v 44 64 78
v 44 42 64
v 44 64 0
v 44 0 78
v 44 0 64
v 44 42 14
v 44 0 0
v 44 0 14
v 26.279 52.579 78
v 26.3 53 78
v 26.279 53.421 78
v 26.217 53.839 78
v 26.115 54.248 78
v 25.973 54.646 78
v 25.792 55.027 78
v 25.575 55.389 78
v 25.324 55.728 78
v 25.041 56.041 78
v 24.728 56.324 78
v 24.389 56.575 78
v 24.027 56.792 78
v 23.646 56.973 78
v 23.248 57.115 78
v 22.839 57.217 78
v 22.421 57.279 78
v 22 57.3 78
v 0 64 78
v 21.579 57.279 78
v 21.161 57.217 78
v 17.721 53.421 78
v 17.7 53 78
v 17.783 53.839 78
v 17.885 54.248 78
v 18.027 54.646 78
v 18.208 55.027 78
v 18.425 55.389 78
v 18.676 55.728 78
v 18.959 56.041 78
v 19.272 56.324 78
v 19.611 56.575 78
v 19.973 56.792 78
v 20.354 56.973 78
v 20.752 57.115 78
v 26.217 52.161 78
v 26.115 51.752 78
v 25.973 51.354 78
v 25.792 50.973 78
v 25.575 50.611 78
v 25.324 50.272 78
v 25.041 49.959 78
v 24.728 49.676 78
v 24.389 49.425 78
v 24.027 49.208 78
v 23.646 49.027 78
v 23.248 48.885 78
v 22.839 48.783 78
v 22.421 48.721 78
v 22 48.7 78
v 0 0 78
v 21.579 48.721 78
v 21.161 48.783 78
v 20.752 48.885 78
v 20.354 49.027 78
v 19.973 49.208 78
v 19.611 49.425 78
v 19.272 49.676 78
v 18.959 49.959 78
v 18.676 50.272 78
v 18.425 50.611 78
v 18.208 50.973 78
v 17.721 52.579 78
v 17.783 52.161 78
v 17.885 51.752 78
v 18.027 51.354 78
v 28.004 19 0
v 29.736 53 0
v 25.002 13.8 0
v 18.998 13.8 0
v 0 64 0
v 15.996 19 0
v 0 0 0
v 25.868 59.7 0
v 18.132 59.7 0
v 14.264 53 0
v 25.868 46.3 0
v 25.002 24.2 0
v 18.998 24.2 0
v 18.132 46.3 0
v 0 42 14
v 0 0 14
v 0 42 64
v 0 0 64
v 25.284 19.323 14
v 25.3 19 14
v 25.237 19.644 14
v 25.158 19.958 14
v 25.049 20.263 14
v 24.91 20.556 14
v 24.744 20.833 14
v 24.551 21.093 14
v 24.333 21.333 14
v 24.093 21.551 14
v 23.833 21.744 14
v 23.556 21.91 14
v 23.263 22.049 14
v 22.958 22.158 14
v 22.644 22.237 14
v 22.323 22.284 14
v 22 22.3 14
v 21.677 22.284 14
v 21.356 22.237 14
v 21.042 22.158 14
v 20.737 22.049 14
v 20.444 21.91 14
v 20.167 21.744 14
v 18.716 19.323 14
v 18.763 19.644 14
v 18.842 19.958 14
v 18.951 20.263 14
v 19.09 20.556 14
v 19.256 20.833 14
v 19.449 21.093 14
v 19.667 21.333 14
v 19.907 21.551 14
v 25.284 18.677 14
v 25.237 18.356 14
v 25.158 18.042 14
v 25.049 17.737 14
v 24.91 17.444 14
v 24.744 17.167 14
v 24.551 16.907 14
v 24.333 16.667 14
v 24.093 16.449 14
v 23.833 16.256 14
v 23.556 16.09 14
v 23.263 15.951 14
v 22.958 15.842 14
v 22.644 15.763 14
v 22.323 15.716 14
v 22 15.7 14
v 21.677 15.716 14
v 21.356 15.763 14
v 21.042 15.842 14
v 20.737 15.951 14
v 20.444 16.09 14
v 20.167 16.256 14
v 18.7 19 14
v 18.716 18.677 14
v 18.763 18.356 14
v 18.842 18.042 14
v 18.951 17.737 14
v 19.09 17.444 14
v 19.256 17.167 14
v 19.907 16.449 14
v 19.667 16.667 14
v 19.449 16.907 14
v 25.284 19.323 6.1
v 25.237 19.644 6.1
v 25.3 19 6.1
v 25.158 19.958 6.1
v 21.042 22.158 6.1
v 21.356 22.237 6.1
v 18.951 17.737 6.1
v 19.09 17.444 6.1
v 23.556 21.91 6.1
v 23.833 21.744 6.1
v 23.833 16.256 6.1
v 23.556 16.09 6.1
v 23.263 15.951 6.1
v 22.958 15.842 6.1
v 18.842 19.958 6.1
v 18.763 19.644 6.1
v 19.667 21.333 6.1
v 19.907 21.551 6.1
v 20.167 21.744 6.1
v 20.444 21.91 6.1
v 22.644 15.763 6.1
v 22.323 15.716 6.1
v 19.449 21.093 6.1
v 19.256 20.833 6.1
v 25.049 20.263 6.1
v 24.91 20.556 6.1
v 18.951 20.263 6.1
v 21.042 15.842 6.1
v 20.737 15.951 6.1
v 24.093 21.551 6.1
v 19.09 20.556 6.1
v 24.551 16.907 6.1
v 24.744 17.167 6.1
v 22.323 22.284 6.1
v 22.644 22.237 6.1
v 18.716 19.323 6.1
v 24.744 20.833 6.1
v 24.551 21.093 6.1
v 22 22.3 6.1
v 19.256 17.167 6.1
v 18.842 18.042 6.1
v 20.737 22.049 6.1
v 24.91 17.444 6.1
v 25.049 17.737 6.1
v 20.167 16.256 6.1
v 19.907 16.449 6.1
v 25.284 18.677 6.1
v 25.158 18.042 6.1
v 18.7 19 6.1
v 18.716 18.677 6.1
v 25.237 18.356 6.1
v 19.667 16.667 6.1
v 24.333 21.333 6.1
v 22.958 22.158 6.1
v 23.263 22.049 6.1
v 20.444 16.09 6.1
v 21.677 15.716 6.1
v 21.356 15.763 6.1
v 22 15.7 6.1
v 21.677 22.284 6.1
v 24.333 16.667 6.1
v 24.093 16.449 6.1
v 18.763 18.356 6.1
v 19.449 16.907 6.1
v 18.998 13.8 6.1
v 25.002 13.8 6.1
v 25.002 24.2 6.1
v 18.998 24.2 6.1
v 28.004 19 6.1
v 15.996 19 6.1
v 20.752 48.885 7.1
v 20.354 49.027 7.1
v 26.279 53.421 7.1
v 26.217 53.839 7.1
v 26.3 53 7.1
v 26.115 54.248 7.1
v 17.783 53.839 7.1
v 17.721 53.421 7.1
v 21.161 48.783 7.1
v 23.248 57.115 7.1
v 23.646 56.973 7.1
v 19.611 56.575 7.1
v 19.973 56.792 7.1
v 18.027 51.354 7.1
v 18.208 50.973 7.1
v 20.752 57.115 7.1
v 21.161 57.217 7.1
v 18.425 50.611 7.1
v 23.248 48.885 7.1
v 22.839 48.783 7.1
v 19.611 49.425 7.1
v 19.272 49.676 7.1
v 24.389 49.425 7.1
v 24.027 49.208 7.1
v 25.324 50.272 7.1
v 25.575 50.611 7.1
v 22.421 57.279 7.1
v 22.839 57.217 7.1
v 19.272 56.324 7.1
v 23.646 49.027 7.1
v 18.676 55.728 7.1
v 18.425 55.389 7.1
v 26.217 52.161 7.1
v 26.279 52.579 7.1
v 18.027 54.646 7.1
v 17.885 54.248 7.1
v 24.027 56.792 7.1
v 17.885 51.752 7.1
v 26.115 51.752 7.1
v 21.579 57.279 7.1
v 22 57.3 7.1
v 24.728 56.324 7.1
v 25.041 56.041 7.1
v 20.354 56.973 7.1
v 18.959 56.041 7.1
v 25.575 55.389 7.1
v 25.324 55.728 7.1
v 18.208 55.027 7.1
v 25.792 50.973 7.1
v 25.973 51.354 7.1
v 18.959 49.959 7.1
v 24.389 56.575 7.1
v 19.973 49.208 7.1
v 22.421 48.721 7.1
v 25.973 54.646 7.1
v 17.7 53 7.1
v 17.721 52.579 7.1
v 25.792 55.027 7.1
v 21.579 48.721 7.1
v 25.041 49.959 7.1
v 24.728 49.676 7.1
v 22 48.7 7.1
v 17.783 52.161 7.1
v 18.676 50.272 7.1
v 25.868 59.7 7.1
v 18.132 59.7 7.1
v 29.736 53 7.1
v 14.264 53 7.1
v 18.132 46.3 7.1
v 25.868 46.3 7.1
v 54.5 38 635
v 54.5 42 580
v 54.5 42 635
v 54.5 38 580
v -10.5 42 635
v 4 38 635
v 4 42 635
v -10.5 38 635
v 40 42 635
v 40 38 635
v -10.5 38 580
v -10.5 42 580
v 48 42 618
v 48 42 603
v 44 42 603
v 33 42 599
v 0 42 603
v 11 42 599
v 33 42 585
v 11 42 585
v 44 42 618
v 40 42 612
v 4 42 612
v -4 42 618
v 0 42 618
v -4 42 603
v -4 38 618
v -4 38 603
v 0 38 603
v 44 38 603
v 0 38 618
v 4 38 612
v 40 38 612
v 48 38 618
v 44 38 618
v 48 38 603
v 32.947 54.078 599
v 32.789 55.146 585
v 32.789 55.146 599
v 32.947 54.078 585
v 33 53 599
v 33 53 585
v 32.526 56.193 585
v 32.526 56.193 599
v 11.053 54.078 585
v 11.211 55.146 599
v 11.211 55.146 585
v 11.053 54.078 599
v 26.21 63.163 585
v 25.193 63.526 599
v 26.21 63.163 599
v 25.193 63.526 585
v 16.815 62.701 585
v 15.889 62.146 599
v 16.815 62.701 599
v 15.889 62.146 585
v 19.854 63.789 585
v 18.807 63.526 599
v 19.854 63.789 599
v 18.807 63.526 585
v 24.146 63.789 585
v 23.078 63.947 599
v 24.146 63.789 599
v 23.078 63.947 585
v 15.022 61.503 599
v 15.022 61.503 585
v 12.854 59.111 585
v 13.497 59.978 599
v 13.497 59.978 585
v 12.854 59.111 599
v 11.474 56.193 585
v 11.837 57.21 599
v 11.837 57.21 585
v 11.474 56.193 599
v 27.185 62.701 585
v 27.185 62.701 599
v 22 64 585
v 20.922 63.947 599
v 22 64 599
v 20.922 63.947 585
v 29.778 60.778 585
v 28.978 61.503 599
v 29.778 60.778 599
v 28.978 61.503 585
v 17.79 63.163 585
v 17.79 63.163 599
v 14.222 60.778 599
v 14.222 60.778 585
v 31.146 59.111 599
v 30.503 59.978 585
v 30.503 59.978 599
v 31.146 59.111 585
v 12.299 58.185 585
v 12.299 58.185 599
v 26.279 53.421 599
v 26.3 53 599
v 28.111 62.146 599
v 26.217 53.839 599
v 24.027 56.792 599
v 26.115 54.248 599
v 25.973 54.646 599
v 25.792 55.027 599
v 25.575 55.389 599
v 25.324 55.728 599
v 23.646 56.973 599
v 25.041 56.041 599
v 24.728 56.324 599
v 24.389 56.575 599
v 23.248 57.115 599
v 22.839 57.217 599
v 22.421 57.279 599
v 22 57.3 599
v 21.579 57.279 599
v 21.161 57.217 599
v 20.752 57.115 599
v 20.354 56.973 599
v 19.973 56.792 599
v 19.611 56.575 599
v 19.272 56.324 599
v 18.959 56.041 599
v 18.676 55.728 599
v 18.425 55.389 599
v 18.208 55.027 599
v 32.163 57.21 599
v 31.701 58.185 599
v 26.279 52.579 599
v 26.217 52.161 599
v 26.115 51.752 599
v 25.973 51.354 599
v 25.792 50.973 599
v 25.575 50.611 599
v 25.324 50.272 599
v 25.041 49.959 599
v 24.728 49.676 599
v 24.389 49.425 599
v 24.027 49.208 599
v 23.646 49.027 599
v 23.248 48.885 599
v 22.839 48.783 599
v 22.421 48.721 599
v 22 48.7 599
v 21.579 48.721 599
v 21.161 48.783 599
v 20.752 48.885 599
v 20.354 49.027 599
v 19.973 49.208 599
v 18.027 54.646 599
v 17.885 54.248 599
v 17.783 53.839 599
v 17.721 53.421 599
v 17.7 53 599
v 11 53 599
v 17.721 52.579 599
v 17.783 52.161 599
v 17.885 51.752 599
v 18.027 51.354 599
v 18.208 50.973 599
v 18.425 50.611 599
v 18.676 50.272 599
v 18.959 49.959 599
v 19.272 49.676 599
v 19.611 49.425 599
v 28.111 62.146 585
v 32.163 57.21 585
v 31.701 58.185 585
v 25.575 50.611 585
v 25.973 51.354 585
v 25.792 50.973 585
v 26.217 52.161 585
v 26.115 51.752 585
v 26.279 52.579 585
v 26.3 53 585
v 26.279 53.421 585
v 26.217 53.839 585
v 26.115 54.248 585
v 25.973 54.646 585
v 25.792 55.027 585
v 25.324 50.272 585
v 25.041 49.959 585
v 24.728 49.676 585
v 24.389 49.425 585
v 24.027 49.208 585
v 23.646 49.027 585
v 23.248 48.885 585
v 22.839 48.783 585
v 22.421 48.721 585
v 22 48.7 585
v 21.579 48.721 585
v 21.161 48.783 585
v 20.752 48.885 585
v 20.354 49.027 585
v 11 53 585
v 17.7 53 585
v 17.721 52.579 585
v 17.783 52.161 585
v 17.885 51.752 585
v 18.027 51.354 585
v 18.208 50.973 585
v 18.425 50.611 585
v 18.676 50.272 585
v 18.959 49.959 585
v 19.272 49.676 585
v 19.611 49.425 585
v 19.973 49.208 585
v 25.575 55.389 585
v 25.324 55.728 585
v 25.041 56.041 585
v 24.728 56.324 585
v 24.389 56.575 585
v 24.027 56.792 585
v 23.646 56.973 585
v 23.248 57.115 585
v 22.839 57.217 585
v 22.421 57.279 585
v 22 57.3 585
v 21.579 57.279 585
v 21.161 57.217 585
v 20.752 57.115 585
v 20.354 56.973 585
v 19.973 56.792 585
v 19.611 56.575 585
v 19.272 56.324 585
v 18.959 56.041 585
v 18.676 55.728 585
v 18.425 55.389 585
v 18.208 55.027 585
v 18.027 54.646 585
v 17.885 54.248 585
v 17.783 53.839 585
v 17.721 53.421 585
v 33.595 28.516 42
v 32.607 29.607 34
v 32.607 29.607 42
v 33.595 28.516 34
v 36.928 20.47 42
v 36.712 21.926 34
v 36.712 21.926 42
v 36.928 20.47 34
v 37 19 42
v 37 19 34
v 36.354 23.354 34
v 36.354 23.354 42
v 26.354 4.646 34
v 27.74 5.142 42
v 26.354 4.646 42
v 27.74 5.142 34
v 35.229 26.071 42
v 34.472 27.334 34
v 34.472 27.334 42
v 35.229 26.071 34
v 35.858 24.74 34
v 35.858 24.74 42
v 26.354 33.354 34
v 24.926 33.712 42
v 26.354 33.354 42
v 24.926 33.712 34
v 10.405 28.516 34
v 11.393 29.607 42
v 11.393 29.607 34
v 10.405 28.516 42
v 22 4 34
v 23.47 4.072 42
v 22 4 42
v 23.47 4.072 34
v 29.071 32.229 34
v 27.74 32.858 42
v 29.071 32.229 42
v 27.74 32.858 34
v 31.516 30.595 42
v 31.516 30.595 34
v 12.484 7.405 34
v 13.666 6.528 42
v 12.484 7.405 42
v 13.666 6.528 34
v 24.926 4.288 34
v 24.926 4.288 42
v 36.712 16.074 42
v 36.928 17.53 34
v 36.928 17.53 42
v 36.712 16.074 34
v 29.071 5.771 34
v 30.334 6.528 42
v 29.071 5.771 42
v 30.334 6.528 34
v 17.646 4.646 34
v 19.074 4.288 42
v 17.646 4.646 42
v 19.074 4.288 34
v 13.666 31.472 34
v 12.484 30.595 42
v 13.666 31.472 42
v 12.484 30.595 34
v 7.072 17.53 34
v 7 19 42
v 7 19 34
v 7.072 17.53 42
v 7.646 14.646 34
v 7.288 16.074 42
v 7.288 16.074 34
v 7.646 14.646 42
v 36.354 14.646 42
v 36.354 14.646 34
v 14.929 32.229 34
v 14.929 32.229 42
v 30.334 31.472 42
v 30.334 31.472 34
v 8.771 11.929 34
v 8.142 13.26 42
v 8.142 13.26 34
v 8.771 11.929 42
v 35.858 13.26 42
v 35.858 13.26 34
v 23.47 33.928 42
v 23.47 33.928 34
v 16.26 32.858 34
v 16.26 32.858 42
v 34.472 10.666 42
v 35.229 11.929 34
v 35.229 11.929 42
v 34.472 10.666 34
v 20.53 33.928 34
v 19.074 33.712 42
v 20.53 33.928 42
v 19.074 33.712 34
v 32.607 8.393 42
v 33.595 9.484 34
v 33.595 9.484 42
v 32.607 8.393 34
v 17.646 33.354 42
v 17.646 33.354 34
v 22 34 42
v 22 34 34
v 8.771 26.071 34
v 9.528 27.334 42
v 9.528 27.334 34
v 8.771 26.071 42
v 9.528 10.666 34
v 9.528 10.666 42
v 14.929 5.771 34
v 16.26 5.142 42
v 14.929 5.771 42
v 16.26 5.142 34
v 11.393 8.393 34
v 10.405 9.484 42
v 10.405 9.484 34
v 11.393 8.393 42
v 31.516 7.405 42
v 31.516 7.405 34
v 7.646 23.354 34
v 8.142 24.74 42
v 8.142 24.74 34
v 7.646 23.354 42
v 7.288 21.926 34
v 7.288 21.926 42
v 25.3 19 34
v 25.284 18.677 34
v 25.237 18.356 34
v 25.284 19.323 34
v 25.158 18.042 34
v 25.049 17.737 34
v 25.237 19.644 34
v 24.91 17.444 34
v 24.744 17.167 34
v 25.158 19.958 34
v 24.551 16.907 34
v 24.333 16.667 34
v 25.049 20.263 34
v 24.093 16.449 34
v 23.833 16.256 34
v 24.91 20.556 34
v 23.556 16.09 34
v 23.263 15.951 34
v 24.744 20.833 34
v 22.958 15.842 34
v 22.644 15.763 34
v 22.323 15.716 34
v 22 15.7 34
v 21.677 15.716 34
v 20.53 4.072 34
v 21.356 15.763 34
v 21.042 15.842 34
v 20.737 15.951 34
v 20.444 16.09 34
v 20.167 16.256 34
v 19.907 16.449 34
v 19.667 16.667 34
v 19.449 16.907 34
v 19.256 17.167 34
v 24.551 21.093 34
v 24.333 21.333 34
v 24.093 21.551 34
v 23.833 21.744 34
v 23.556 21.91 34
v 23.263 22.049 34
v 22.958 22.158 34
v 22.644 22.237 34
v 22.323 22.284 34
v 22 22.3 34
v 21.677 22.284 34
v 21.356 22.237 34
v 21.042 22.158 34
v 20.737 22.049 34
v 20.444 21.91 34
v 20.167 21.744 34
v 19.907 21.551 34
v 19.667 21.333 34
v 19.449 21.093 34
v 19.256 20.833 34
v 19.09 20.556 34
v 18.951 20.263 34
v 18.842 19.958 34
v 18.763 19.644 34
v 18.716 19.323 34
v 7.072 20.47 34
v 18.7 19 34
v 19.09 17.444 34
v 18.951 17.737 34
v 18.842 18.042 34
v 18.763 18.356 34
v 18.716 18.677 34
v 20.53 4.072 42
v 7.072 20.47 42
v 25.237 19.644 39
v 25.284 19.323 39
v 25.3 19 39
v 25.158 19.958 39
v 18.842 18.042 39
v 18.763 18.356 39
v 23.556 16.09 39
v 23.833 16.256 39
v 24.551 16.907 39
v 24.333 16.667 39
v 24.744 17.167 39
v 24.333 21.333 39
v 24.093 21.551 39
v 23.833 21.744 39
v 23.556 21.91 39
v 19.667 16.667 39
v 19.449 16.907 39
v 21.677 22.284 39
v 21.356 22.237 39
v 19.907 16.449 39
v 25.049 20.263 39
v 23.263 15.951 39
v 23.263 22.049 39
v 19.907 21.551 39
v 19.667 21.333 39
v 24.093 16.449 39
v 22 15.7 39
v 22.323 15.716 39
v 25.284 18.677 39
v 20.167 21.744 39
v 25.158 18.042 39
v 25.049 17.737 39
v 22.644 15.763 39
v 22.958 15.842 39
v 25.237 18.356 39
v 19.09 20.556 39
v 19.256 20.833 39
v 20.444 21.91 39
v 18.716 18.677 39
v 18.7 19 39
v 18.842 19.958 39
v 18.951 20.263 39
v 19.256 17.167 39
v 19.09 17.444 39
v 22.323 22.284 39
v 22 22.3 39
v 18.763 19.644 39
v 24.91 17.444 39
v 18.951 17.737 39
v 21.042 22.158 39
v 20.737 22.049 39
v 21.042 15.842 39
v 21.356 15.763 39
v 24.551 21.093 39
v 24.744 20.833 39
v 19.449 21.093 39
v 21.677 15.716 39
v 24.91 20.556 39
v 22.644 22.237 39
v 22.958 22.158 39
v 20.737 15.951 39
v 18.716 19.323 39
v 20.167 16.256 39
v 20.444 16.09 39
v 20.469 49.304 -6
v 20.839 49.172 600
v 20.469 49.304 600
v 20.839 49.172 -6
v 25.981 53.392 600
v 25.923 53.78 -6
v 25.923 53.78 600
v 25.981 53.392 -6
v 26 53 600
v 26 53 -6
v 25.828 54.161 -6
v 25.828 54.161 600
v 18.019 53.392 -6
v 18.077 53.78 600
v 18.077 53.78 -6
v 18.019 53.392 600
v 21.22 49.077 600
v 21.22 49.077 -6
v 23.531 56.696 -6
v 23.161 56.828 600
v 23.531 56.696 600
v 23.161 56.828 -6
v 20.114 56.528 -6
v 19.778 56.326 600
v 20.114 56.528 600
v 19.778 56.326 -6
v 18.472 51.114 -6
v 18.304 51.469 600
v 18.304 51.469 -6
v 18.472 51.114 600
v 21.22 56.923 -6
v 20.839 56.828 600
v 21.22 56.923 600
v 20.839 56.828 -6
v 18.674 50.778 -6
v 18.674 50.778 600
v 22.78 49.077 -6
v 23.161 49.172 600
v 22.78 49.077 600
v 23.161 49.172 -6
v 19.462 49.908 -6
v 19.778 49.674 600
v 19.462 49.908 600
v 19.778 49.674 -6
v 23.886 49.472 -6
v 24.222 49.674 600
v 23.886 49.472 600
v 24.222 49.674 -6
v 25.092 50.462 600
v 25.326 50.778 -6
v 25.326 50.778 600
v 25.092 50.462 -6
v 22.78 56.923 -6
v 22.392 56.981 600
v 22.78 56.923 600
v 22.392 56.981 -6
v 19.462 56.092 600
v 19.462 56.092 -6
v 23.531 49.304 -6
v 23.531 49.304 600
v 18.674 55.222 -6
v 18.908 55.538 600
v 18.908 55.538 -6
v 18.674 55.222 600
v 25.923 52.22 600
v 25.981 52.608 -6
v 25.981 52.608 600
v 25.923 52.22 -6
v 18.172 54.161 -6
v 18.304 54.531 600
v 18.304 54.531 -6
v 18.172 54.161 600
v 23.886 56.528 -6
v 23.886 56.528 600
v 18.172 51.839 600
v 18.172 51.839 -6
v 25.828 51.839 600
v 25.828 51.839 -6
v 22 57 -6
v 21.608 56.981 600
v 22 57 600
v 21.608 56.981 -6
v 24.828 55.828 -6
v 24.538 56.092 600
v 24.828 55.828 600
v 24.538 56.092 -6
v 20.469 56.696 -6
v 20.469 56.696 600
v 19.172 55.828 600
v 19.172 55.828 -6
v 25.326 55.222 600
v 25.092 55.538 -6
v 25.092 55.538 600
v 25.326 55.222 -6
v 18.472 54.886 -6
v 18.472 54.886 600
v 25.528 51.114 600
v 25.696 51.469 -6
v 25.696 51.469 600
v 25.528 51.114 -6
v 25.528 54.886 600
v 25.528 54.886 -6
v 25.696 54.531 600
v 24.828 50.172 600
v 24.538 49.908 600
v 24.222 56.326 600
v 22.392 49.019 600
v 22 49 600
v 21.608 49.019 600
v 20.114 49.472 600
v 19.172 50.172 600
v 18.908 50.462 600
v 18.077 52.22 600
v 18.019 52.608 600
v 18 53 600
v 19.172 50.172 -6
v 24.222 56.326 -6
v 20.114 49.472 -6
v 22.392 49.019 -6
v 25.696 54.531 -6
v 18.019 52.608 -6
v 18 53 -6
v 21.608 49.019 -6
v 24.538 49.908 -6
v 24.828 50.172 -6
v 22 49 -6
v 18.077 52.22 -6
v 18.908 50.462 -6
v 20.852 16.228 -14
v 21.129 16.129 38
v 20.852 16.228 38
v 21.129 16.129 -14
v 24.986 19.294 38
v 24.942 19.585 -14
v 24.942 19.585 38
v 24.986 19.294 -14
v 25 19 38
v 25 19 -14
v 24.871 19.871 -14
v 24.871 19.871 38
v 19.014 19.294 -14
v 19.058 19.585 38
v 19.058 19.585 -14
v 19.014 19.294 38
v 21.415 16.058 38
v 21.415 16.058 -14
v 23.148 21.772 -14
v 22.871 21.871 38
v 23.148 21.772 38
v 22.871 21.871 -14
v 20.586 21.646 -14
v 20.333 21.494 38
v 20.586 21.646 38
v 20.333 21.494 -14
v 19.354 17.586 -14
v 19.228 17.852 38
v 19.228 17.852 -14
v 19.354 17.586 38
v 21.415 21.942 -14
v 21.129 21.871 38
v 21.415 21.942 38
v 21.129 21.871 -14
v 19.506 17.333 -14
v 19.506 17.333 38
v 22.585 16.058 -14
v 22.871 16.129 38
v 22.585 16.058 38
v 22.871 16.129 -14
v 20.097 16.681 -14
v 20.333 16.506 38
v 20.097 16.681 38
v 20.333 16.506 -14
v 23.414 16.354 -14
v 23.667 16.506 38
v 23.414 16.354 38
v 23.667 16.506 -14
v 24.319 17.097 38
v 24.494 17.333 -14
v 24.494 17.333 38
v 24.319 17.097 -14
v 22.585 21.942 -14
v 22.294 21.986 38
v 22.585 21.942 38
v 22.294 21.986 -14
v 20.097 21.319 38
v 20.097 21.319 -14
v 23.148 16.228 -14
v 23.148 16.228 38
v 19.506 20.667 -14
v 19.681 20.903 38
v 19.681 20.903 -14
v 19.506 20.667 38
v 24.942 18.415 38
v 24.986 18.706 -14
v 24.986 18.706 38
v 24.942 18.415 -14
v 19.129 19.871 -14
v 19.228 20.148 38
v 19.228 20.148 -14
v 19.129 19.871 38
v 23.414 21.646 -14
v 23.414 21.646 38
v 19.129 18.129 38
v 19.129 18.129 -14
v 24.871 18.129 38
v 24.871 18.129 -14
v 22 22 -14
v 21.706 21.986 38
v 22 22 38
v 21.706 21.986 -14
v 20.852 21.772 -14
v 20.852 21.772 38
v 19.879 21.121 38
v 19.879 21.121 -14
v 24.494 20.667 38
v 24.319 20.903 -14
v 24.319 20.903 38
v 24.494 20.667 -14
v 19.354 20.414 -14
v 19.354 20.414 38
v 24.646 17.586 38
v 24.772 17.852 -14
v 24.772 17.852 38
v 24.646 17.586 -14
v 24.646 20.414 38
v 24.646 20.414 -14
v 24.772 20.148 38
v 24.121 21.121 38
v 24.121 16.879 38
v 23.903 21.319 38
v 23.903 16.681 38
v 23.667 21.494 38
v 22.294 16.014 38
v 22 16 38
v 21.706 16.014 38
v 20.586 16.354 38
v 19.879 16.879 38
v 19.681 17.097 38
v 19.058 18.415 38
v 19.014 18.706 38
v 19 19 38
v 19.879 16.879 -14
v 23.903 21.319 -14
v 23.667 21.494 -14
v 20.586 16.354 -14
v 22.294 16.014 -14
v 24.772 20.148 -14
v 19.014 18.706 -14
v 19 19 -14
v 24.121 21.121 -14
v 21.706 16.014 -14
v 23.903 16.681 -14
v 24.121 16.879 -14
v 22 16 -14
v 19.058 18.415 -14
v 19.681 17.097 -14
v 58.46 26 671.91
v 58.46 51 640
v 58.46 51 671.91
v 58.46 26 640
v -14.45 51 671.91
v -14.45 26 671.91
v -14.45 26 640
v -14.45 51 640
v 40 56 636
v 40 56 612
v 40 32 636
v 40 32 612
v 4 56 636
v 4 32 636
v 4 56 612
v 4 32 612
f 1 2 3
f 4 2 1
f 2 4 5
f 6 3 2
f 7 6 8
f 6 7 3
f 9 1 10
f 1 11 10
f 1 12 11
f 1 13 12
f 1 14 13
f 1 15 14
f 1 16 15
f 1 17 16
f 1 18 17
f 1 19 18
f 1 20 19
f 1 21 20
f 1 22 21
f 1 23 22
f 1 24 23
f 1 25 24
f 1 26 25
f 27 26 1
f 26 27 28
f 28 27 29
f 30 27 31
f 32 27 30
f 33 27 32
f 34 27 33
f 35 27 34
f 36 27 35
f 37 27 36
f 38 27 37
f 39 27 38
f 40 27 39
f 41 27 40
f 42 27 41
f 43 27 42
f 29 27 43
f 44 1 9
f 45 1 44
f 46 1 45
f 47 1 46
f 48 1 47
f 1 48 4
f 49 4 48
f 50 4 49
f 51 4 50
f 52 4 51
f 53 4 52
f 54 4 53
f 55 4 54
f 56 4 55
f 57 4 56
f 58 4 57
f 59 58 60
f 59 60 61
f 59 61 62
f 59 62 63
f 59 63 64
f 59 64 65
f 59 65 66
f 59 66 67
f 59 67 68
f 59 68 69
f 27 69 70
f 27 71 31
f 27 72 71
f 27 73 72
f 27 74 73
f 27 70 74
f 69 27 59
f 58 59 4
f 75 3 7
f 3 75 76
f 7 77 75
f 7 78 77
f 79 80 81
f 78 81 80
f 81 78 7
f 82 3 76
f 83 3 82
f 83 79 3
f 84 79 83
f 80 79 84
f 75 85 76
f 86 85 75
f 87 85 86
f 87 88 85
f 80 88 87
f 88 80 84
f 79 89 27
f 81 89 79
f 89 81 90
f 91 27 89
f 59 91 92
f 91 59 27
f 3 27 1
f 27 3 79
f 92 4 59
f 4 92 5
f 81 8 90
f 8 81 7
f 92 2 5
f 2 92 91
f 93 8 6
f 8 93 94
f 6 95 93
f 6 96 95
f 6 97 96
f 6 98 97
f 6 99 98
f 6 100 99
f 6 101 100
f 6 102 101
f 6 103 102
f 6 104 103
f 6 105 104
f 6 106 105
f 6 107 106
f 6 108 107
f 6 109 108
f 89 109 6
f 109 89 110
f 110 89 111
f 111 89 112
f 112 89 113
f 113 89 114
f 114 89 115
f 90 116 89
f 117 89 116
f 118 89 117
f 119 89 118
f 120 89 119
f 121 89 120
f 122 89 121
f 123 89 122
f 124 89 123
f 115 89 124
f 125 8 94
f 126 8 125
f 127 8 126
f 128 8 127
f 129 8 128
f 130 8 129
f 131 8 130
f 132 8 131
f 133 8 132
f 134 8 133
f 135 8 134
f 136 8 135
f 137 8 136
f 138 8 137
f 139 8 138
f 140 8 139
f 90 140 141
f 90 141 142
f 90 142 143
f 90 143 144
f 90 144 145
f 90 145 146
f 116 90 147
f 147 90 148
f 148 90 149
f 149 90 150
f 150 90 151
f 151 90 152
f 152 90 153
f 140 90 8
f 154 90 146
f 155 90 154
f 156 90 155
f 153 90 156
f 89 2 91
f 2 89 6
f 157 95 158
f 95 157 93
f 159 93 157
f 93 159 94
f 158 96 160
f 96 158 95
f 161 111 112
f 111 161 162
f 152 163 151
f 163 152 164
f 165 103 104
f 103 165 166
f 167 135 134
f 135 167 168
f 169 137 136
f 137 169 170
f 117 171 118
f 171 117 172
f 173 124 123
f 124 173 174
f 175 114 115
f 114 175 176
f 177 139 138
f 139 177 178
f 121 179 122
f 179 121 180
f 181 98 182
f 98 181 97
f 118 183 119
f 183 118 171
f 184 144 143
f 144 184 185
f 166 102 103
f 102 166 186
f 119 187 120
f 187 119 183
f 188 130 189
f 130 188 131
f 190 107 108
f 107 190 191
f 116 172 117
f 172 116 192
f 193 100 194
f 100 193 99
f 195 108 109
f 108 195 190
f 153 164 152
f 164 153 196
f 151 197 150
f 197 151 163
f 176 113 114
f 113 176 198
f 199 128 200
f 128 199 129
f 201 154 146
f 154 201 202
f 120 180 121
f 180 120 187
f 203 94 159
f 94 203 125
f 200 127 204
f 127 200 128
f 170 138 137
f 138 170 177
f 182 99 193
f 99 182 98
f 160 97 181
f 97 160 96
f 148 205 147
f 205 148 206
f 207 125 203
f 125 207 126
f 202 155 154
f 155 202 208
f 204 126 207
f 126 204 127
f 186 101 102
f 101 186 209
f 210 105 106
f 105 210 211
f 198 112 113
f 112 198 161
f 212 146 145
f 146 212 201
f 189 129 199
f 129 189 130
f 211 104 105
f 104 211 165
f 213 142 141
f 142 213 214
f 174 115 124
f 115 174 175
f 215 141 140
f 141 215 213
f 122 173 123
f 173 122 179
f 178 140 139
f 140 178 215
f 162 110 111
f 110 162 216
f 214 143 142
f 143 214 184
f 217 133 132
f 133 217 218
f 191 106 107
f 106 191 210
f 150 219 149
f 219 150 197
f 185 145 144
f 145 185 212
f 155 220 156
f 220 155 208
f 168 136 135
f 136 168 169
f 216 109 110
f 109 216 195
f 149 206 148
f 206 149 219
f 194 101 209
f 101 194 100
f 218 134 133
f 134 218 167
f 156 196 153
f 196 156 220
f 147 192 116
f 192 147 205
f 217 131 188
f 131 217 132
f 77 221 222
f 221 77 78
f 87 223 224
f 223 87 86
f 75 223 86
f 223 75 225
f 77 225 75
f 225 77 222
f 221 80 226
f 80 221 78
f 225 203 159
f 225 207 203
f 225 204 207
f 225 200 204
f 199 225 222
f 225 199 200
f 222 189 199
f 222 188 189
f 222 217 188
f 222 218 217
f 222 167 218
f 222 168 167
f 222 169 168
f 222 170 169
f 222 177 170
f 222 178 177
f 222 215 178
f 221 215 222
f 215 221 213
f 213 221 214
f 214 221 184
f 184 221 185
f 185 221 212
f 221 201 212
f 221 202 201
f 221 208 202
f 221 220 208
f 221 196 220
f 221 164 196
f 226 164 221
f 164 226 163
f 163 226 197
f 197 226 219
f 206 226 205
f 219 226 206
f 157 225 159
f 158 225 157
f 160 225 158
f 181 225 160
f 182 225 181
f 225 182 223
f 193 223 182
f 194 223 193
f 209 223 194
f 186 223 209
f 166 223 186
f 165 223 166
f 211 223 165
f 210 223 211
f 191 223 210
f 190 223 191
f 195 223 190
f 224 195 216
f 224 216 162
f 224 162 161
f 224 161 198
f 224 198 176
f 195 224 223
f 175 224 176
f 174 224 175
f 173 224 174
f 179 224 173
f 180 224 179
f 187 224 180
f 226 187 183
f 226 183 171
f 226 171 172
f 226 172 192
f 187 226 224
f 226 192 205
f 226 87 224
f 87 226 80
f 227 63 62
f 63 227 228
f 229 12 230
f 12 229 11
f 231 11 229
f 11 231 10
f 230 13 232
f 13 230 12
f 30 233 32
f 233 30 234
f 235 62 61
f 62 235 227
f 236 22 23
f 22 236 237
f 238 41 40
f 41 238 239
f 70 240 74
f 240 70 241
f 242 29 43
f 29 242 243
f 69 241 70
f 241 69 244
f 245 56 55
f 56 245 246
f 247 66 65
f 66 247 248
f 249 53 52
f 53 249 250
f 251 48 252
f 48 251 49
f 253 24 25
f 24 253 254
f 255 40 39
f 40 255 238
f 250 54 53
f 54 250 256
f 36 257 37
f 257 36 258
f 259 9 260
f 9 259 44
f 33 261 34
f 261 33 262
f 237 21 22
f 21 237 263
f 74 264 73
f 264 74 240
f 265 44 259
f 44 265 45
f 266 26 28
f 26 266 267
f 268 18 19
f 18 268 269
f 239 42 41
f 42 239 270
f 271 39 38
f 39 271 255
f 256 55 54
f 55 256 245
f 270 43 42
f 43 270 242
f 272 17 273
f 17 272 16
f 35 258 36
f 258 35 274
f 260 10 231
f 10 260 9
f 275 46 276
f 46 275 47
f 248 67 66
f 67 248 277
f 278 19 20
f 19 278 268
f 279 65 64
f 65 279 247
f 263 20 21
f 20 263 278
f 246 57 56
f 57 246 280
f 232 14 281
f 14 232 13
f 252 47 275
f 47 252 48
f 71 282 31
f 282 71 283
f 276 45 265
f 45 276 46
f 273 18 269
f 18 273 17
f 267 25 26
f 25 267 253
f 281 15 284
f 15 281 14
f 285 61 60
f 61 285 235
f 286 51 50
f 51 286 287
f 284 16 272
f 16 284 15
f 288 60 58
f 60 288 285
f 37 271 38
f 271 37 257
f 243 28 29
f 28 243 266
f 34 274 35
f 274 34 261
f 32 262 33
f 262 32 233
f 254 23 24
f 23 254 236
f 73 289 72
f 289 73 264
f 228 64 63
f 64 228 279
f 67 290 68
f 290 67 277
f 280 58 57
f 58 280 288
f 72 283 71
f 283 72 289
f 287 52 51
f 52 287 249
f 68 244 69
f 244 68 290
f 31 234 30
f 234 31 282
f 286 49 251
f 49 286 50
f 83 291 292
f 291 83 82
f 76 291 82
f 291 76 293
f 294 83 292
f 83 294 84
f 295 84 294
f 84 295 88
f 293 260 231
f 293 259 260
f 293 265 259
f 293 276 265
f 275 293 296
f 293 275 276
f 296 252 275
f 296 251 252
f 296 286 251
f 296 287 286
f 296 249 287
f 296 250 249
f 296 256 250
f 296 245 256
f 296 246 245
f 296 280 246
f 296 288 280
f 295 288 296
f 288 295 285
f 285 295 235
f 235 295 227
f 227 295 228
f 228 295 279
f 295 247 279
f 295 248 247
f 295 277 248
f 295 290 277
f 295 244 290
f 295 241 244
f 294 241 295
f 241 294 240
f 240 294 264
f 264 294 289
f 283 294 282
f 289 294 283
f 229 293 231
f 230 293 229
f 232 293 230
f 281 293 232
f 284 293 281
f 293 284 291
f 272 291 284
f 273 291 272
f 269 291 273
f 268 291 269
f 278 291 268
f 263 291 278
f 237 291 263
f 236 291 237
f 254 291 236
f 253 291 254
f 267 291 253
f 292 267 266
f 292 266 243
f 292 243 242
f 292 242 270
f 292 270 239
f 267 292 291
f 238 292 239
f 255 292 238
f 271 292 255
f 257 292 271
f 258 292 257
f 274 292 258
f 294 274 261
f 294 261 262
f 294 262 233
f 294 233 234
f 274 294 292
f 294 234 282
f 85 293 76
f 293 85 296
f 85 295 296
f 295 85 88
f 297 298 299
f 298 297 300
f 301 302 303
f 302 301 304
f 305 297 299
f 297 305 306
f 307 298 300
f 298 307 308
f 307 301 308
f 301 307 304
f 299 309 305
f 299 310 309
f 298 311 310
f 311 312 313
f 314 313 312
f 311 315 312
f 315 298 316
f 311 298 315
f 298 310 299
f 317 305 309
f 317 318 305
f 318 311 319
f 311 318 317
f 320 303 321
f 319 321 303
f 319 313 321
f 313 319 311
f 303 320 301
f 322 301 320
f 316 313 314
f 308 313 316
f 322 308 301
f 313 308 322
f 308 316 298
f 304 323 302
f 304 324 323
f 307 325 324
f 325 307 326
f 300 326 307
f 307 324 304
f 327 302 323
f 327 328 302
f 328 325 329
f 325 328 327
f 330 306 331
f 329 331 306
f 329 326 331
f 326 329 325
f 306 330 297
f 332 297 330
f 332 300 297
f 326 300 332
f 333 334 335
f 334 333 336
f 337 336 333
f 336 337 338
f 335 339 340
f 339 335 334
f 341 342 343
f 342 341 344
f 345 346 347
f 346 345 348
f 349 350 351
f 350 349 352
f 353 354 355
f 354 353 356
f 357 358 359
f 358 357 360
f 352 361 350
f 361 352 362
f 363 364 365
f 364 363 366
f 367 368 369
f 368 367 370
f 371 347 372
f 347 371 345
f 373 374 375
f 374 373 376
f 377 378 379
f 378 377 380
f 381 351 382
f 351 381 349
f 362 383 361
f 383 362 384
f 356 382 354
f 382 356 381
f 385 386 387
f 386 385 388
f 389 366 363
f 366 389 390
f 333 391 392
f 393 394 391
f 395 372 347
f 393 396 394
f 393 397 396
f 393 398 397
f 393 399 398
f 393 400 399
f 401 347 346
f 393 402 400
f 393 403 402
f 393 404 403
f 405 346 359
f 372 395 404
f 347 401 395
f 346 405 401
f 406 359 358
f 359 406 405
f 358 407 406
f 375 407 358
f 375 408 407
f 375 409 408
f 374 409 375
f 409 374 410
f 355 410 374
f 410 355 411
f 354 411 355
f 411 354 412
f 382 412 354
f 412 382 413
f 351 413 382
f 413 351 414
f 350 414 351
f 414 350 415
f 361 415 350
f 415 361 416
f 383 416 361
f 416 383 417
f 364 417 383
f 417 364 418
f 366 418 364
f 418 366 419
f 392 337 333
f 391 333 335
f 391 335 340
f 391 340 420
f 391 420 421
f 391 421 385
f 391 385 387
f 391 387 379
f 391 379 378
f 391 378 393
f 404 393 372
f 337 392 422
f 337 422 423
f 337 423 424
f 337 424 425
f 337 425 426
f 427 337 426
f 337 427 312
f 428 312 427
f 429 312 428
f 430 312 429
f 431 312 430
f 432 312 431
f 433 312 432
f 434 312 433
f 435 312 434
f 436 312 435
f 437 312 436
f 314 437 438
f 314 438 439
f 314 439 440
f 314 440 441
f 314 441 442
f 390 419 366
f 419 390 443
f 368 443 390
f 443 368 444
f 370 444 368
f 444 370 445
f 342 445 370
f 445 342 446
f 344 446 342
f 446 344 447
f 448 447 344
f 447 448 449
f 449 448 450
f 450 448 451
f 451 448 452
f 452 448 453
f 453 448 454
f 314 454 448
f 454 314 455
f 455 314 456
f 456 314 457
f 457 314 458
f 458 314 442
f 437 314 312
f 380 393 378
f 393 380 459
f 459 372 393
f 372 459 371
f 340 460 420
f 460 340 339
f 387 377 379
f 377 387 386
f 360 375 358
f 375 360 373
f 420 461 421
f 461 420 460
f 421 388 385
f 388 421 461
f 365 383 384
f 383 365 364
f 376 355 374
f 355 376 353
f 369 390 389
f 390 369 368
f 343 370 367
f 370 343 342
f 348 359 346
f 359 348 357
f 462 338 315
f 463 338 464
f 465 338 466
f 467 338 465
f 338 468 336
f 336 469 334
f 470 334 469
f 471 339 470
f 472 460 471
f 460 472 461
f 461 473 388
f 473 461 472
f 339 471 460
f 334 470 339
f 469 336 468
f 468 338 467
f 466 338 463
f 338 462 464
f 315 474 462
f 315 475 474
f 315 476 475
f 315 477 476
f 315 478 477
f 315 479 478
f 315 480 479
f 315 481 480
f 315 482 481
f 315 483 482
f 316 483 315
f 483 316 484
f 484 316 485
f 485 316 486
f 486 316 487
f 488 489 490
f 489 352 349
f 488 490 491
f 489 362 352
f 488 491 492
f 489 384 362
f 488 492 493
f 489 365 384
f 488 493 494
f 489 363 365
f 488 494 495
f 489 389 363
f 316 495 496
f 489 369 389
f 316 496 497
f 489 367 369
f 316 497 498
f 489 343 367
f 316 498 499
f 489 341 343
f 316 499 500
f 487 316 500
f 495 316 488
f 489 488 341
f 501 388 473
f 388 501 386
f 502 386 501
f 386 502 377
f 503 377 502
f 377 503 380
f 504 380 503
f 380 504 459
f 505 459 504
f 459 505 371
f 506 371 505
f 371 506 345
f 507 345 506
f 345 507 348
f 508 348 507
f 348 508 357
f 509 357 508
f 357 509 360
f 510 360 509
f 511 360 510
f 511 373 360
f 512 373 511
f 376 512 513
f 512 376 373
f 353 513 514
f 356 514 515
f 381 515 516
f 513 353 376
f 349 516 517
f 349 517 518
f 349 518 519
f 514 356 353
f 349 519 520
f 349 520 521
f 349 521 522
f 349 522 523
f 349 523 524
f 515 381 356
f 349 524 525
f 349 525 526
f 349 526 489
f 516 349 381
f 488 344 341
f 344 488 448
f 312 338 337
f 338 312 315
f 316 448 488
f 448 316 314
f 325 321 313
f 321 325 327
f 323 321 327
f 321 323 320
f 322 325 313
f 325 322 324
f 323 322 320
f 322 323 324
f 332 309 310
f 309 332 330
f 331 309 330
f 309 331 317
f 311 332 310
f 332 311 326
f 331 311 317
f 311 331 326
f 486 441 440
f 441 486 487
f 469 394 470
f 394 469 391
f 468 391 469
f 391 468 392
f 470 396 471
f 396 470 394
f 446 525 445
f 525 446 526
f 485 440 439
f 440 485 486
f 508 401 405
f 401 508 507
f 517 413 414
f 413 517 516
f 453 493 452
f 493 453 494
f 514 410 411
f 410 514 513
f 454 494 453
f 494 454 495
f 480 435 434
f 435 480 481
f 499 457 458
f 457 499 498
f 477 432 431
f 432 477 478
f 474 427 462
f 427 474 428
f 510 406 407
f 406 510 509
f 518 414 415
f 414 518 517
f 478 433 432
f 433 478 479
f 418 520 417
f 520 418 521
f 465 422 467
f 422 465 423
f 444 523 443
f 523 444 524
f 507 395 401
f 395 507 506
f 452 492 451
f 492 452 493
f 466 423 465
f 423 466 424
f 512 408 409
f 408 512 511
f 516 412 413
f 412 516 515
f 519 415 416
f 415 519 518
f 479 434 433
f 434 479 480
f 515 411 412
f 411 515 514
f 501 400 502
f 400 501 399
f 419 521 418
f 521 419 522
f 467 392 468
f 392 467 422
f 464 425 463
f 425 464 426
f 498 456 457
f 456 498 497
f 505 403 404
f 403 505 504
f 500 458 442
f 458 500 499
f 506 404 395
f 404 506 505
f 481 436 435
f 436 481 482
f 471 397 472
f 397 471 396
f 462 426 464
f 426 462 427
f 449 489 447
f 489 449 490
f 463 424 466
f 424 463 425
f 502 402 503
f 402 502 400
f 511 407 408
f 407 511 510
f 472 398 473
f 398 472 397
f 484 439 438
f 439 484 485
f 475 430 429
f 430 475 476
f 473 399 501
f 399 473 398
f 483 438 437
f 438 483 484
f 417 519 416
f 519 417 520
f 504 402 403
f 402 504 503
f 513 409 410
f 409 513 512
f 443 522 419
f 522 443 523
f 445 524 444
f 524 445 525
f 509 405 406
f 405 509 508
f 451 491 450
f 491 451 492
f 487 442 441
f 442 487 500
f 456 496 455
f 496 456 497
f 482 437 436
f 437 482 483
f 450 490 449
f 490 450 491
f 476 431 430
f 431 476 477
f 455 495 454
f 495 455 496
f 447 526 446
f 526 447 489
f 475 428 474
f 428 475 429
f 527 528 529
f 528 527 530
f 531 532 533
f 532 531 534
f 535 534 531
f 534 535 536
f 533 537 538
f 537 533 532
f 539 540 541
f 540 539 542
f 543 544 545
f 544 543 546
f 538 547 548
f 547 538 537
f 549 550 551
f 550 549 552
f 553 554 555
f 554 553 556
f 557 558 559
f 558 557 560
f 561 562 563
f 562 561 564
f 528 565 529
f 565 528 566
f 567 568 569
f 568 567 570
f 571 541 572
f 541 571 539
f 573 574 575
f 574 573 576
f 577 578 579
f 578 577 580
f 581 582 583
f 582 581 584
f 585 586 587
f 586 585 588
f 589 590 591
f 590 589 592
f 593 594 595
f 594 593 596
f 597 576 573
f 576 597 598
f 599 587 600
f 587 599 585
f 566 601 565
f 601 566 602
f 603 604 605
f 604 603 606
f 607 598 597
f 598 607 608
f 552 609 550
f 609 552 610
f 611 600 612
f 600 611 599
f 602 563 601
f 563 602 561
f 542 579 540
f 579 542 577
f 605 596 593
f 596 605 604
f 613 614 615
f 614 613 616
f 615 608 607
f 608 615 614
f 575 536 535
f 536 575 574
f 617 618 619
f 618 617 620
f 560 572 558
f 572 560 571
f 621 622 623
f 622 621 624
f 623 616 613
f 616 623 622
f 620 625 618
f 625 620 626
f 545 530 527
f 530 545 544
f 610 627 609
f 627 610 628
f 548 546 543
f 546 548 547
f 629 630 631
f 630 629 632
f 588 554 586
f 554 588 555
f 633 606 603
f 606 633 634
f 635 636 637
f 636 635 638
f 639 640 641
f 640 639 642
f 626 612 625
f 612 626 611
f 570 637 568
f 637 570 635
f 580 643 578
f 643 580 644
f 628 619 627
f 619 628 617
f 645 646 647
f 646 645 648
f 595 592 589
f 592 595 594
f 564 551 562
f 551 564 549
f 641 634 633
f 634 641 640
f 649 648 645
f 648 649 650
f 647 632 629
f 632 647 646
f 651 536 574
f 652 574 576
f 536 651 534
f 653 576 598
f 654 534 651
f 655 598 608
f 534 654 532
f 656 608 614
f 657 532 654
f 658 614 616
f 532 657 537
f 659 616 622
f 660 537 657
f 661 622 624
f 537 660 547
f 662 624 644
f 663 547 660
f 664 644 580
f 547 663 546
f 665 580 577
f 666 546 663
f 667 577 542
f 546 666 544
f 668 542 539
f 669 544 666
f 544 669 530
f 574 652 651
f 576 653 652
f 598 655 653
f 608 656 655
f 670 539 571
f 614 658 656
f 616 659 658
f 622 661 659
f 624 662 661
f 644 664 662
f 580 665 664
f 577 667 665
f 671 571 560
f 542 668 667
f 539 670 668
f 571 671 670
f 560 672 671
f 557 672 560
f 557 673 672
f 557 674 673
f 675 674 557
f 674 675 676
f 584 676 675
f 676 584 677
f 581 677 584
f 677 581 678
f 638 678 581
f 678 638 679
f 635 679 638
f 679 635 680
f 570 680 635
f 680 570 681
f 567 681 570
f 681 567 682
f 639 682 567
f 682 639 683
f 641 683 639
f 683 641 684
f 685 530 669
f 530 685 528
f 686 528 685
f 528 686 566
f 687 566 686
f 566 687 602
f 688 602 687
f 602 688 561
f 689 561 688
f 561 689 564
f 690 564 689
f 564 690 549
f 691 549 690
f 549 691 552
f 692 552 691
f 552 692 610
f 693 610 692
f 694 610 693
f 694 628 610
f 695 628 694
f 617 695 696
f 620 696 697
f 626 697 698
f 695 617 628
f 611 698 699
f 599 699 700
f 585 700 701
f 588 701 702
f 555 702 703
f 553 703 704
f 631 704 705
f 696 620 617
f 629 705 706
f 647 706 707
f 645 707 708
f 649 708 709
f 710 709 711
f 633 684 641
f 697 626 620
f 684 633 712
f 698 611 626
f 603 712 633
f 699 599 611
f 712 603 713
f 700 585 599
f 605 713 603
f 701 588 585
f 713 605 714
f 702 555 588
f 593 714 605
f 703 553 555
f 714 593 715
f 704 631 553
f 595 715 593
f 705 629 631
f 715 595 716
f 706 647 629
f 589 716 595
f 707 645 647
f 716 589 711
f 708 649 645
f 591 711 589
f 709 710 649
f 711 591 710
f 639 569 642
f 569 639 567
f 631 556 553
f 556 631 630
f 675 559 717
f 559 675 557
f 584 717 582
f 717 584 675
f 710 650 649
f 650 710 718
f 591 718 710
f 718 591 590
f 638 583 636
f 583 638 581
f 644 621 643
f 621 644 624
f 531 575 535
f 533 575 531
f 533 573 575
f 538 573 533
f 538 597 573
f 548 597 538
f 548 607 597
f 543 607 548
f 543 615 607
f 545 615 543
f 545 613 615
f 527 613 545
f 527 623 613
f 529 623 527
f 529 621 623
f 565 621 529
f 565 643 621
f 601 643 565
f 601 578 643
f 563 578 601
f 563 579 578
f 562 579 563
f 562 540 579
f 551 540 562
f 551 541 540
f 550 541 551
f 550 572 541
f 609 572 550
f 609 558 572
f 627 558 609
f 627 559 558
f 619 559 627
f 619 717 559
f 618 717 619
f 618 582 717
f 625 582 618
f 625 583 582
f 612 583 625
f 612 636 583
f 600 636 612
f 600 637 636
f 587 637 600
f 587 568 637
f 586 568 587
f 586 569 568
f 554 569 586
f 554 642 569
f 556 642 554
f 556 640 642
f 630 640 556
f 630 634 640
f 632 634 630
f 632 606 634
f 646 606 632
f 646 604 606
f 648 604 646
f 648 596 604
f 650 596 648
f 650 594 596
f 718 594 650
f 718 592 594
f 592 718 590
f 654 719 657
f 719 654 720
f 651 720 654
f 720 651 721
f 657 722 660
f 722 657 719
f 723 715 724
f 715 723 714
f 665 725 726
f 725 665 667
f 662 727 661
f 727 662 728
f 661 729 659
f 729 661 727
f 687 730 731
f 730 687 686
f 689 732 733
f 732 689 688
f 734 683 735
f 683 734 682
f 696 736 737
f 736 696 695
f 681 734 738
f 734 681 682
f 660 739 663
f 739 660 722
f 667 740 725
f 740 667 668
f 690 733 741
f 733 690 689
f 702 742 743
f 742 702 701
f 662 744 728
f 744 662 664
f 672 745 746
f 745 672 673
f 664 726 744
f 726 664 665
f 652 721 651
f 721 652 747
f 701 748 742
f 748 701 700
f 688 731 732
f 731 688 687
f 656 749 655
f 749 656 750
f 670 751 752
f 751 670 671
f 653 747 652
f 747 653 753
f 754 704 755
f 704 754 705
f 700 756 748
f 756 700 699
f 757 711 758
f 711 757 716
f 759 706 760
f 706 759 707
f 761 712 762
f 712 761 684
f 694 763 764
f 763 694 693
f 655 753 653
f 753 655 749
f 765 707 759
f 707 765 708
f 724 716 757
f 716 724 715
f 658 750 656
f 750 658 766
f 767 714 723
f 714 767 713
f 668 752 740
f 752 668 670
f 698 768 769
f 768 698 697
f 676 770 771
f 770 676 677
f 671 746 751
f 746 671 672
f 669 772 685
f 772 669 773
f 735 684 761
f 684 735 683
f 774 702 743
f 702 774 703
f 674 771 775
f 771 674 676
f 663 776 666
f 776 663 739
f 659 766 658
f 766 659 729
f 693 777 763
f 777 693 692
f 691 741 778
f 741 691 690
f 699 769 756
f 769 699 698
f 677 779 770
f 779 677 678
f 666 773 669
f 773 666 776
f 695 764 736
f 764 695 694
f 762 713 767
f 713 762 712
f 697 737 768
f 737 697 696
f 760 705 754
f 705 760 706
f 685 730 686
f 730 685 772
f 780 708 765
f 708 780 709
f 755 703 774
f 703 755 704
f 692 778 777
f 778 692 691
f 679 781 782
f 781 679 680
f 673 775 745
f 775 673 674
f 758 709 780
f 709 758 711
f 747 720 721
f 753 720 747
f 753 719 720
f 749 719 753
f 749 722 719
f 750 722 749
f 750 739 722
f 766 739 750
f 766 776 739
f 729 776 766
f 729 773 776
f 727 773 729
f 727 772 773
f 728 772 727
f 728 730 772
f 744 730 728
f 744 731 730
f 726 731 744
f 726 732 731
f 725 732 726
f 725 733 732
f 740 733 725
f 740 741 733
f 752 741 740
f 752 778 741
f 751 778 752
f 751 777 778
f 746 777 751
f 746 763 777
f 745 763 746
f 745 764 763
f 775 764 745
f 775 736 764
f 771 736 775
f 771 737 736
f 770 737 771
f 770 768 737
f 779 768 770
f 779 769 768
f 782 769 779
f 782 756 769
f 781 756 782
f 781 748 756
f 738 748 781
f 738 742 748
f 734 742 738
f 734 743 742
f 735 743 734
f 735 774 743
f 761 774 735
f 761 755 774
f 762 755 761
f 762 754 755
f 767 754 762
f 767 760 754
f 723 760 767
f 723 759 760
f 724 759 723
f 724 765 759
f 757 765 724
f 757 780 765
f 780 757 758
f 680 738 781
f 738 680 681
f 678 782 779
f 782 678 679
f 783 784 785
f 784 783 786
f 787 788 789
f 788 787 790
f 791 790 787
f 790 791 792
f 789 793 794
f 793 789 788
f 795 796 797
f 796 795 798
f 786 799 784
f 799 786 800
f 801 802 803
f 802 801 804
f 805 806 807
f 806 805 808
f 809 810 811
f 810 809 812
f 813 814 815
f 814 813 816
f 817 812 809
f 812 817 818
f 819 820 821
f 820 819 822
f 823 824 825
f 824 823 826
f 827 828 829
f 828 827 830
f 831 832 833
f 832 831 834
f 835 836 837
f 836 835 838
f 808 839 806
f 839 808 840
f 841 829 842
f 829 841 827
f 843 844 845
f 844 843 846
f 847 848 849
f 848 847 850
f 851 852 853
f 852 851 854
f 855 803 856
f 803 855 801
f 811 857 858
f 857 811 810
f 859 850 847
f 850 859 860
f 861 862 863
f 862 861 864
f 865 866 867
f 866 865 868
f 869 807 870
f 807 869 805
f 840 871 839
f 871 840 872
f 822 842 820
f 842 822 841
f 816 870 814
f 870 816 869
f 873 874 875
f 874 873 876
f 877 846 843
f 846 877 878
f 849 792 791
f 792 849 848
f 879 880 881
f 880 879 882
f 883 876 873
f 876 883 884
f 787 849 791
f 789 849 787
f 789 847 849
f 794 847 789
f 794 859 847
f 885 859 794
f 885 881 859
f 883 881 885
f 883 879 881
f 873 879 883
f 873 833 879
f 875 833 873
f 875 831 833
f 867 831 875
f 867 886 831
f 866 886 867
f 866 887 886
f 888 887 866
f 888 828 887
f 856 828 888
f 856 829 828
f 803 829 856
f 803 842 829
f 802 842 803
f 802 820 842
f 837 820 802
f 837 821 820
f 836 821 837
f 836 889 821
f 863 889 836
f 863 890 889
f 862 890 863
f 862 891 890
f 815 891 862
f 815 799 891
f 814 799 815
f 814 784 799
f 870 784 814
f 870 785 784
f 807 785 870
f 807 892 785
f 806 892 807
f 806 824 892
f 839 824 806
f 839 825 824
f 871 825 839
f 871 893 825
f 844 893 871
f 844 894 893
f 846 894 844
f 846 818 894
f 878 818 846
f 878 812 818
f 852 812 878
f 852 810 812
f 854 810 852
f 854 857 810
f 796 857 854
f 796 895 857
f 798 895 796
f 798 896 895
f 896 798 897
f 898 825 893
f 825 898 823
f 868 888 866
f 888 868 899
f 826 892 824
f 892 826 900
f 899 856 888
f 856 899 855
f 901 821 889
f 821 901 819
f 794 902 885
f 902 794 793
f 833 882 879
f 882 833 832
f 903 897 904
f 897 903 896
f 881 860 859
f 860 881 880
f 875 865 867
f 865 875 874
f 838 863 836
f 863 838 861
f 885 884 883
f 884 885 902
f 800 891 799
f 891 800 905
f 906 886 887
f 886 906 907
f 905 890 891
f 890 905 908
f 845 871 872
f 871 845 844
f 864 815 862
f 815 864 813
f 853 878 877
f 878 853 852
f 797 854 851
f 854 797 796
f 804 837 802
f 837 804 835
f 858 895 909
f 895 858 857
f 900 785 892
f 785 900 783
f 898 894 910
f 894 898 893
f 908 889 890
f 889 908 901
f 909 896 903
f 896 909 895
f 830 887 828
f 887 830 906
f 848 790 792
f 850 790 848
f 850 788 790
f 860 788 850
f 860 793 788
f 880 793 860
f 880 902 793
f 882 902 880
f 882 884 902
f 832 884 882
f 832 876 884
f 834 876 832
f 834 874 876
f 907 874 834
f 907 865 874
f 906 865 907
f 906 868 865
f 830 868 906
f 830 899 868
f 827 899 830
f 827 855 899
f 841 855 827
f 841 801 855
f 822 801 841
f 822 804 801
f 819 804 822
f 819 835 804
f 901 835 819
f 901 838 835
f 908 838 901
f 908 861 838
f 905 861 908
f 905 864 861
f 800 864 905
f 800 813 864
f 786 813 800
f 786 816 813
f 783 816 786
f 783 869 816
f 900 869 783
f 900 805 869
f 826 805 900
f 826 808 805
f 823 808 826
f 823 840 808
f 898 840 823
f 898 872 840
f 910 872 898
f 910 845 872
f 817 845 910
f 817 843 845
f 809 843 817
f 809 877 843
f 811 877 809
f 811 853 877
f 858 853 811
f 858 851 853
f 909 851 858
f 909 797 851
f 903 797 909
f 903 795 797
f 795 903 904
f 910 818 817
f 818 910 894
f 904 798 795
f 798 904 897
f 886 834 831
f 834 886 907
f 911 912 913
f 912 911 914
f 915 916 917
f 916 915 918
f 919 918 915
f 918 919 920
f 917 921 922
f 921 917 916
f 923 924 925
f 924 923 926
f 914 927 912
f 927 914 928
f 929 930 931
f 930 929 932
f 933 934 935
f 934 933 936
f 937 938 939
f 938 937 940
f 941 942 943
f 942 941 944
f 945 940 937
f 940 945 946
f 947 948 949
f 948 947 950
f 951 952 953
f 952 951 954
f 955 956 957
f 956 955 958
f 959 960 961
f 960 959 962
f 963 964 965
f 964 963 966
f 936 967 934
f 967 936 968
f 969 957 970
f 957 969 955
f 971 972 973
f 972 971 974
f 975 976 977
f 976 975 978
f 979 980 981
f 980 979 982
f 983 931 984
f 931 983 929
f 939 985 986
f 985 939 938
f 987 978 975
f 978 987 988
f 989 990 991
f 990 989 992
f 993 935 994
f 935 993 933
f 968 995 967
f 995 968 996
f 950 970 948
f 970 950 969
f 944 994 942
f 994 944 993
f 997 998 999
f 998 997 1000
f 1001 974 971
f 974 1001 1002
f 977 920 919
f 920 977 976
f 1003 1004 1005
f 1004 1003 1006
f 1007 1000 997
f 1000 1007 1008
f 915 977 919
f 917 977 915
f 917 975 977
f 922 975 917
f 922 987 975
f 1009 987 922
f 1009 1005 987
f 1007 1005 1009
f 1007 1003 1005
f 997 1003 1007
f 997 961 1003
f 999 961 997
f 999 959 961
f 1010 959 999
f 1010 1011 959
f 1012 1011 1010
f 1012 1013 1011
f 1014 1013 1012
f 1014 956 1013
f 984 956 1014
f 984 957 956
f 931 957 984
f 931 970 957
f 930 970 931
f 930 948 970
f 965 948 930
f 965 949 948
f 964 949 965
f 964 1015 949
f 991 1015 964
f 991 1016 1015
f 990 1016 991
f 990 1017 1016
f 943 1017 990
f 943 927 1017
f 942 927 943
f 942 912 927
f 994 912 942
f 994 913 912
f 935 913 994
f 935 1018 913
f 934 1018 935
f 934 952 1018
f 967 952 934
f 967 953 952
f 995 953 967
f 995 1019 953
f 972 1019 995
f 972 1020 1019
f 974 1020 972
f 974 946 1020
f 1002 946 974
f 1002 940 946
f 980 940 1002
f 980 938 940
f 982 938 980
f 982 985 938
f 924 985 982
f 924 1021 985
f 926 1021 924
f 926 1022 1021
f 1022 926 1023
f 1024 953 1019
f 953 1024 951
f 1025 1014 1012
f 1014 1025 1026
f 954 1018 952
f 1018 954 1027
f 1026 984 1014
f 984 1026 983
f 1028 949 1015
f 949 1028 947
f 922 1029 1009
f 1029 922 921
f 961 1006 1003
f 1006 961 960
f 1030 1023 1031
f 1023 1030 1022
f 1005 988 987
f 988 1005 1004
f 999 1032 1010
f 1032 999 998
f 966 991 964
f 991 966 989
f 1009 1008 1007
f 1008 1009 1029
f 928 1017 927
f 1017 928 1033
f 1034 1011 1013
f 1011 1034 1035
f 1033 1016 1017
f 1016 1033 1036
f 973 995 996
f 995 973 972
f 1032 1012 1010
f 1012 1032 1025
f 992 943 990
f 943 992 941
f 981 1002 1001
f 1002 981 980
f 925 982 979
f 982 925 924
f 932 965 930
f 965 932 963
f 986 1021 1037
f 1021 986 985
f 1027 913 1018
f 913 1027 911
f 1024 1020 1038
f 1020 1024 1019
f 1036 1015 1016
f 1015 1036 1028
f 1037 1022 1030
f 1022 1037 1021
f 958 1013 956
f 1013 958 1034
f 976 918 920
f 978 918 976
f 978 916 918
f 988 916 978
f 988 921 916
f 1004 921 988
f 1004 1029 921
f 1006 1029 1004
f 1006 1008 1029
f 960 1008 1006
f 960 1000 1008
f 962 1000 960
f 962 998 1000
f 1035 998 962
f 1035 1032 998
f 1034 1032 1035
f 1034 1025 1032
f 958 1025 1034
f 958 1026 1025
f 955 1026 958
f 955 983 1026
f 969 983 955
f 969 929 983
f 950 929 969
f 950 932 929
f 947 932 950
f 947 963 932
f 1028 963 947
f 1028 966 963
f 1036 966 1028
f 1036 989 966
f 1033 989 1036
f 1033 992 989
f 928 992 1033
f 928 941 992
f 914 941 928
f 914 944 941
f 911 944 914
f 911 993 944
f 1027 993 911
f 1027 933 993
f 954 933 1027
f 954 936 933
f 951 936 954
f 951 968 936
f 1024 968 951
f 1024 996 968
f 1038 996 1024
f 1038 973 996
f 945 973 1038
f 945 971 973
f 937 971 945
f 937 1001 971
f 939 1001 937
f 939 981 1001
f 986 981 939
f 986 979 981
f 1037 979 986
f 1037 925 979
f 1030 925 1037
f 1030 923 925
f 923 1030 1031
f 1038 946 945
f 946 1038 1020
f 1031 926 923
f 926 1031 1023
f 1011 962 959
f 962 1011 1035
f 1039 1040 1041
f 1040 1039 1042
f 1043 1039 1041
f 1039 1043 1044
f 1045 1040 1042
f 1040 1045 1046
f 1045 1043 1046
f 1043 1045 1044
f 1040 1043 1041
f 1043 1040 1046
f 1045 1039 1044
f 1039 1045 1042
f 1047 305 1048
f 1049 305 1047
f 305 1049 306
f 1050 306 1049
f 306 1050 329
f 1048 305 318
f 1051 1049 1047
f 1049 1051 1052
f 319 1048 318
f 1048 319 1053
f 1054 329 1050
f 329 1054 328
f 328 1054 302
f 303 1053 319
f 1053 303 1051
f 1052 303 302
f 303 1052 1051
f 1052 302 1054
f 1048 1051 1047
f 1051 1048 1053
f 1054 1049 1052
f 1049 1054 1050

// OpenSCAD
// Creality S1 monitoring mount prototype, 2026-10-26.
// Original source: AGPL-3.0-or-later. Session title unavailable.
// Retains the original webcam clip; no camera housing or printer modifications.
// All dimensions mm. Physical fit, strength and clearance remain unqualified.
part = "assembly"; // clamp, shoe, pad, coupon3, coupon4, coupon5, assembly
$fn = 64;
rod_d = 8.6;
rod_length = 600;
clip_plate_thickness = 4;
clamp_width = 44;
clamp_depth = 64;
clamp_height = 78;
jaw = 14;
spine = 22;

module hex_bore(af,h) { cylinder(d=af/cos(30),h=h,$fn=6); }
module clamp() {
    difference() {
        cube([clamp_width,clamp_depth,clamp_height]);
        translate([-1,-1,jaw]) cube([clamp_width+2,clamp_depth-spine+1,clamp_height-2*jaw]);
        translate([22,19,-1]) cylinder(d=6.6,h=jaw+2);
        translate([22,19,-.1]) hex_bore(10.4,6.2);
        translate([22,53,-1]) cylinder(d=rod_d,h=clamp_height+2);
        translate([22,53,-.1]) hex_bore(13.4,7.2);
    }
}
module shoe() {
    difference() {
        union() {
            translate([-32.5,0,0]) cube([65,clip_plate_thickness,55]);
            translate([0,15,5]) cylinder(d=22,h=14);
            translate([-11,clip_plate_thickness-1,5]) cube([22,16-clip_plate_thickness,14]);
        }
        translate([0,15,4]) cylinder(d=rod_d,h=16);
        for(x=[-24,24]) translate([x-2,-1,23]) cube([4,clip_plate_thickness+2,15]);
    }
}
module pad() {
    difference() {
        cylinder(d=30,h=8);
        translate([0,0,-1]) cylinder(d=6.6,h=6);
    }
}
module coupon(t) {
    // Clip-fit plate only. Print one before the full mount.
    translate([-27.5,-17.5,0]) cube([55,35,t]);
}
module assembly() {
    color([.08,.37,.40]) clamp();
    color([.65,.69,.72]) translate([22,53,-6]) cylinder(d=8,h=rod_length+6);
    color([.08,.37,.40]) translate([22,38,rod_length-20]) shoe();
    color([.65,.69,.72]) translate([22,19,-14]) cylinder(d=6,h=52);
    color([.25,.27,.28]) translate([22,19,34]) pad();
    // Camera/clip are schematic envelopes, not measured replacement geometry.
    color([.12,.13,.14]) translate([22-36.45,26,rod_length+40]) cube([72.91,25,31.91]);
    color([.08,.08,.09]) translate([22-18,32,rod_length+12]) cube([36,24,24]);
}
if(part=="clamp") translate([0,0,clamp_width]) rotate([0,90,0]) clamp();
else if(part=="shoe") translate([32.5,55,0]) rotate([90,0,0]) shoe();
else if(part=="pad") translate([15,15,0]) pad();
else if(part=="coupon3") translate([27.5,17.5,0]) coupon(3);
else if(part=="coupon4") translate([27.5,17.5,0]) coupon(4);
else if(part=="coupon5") translate([27.5,17.5,0]) coupon(5);
else assembly();
